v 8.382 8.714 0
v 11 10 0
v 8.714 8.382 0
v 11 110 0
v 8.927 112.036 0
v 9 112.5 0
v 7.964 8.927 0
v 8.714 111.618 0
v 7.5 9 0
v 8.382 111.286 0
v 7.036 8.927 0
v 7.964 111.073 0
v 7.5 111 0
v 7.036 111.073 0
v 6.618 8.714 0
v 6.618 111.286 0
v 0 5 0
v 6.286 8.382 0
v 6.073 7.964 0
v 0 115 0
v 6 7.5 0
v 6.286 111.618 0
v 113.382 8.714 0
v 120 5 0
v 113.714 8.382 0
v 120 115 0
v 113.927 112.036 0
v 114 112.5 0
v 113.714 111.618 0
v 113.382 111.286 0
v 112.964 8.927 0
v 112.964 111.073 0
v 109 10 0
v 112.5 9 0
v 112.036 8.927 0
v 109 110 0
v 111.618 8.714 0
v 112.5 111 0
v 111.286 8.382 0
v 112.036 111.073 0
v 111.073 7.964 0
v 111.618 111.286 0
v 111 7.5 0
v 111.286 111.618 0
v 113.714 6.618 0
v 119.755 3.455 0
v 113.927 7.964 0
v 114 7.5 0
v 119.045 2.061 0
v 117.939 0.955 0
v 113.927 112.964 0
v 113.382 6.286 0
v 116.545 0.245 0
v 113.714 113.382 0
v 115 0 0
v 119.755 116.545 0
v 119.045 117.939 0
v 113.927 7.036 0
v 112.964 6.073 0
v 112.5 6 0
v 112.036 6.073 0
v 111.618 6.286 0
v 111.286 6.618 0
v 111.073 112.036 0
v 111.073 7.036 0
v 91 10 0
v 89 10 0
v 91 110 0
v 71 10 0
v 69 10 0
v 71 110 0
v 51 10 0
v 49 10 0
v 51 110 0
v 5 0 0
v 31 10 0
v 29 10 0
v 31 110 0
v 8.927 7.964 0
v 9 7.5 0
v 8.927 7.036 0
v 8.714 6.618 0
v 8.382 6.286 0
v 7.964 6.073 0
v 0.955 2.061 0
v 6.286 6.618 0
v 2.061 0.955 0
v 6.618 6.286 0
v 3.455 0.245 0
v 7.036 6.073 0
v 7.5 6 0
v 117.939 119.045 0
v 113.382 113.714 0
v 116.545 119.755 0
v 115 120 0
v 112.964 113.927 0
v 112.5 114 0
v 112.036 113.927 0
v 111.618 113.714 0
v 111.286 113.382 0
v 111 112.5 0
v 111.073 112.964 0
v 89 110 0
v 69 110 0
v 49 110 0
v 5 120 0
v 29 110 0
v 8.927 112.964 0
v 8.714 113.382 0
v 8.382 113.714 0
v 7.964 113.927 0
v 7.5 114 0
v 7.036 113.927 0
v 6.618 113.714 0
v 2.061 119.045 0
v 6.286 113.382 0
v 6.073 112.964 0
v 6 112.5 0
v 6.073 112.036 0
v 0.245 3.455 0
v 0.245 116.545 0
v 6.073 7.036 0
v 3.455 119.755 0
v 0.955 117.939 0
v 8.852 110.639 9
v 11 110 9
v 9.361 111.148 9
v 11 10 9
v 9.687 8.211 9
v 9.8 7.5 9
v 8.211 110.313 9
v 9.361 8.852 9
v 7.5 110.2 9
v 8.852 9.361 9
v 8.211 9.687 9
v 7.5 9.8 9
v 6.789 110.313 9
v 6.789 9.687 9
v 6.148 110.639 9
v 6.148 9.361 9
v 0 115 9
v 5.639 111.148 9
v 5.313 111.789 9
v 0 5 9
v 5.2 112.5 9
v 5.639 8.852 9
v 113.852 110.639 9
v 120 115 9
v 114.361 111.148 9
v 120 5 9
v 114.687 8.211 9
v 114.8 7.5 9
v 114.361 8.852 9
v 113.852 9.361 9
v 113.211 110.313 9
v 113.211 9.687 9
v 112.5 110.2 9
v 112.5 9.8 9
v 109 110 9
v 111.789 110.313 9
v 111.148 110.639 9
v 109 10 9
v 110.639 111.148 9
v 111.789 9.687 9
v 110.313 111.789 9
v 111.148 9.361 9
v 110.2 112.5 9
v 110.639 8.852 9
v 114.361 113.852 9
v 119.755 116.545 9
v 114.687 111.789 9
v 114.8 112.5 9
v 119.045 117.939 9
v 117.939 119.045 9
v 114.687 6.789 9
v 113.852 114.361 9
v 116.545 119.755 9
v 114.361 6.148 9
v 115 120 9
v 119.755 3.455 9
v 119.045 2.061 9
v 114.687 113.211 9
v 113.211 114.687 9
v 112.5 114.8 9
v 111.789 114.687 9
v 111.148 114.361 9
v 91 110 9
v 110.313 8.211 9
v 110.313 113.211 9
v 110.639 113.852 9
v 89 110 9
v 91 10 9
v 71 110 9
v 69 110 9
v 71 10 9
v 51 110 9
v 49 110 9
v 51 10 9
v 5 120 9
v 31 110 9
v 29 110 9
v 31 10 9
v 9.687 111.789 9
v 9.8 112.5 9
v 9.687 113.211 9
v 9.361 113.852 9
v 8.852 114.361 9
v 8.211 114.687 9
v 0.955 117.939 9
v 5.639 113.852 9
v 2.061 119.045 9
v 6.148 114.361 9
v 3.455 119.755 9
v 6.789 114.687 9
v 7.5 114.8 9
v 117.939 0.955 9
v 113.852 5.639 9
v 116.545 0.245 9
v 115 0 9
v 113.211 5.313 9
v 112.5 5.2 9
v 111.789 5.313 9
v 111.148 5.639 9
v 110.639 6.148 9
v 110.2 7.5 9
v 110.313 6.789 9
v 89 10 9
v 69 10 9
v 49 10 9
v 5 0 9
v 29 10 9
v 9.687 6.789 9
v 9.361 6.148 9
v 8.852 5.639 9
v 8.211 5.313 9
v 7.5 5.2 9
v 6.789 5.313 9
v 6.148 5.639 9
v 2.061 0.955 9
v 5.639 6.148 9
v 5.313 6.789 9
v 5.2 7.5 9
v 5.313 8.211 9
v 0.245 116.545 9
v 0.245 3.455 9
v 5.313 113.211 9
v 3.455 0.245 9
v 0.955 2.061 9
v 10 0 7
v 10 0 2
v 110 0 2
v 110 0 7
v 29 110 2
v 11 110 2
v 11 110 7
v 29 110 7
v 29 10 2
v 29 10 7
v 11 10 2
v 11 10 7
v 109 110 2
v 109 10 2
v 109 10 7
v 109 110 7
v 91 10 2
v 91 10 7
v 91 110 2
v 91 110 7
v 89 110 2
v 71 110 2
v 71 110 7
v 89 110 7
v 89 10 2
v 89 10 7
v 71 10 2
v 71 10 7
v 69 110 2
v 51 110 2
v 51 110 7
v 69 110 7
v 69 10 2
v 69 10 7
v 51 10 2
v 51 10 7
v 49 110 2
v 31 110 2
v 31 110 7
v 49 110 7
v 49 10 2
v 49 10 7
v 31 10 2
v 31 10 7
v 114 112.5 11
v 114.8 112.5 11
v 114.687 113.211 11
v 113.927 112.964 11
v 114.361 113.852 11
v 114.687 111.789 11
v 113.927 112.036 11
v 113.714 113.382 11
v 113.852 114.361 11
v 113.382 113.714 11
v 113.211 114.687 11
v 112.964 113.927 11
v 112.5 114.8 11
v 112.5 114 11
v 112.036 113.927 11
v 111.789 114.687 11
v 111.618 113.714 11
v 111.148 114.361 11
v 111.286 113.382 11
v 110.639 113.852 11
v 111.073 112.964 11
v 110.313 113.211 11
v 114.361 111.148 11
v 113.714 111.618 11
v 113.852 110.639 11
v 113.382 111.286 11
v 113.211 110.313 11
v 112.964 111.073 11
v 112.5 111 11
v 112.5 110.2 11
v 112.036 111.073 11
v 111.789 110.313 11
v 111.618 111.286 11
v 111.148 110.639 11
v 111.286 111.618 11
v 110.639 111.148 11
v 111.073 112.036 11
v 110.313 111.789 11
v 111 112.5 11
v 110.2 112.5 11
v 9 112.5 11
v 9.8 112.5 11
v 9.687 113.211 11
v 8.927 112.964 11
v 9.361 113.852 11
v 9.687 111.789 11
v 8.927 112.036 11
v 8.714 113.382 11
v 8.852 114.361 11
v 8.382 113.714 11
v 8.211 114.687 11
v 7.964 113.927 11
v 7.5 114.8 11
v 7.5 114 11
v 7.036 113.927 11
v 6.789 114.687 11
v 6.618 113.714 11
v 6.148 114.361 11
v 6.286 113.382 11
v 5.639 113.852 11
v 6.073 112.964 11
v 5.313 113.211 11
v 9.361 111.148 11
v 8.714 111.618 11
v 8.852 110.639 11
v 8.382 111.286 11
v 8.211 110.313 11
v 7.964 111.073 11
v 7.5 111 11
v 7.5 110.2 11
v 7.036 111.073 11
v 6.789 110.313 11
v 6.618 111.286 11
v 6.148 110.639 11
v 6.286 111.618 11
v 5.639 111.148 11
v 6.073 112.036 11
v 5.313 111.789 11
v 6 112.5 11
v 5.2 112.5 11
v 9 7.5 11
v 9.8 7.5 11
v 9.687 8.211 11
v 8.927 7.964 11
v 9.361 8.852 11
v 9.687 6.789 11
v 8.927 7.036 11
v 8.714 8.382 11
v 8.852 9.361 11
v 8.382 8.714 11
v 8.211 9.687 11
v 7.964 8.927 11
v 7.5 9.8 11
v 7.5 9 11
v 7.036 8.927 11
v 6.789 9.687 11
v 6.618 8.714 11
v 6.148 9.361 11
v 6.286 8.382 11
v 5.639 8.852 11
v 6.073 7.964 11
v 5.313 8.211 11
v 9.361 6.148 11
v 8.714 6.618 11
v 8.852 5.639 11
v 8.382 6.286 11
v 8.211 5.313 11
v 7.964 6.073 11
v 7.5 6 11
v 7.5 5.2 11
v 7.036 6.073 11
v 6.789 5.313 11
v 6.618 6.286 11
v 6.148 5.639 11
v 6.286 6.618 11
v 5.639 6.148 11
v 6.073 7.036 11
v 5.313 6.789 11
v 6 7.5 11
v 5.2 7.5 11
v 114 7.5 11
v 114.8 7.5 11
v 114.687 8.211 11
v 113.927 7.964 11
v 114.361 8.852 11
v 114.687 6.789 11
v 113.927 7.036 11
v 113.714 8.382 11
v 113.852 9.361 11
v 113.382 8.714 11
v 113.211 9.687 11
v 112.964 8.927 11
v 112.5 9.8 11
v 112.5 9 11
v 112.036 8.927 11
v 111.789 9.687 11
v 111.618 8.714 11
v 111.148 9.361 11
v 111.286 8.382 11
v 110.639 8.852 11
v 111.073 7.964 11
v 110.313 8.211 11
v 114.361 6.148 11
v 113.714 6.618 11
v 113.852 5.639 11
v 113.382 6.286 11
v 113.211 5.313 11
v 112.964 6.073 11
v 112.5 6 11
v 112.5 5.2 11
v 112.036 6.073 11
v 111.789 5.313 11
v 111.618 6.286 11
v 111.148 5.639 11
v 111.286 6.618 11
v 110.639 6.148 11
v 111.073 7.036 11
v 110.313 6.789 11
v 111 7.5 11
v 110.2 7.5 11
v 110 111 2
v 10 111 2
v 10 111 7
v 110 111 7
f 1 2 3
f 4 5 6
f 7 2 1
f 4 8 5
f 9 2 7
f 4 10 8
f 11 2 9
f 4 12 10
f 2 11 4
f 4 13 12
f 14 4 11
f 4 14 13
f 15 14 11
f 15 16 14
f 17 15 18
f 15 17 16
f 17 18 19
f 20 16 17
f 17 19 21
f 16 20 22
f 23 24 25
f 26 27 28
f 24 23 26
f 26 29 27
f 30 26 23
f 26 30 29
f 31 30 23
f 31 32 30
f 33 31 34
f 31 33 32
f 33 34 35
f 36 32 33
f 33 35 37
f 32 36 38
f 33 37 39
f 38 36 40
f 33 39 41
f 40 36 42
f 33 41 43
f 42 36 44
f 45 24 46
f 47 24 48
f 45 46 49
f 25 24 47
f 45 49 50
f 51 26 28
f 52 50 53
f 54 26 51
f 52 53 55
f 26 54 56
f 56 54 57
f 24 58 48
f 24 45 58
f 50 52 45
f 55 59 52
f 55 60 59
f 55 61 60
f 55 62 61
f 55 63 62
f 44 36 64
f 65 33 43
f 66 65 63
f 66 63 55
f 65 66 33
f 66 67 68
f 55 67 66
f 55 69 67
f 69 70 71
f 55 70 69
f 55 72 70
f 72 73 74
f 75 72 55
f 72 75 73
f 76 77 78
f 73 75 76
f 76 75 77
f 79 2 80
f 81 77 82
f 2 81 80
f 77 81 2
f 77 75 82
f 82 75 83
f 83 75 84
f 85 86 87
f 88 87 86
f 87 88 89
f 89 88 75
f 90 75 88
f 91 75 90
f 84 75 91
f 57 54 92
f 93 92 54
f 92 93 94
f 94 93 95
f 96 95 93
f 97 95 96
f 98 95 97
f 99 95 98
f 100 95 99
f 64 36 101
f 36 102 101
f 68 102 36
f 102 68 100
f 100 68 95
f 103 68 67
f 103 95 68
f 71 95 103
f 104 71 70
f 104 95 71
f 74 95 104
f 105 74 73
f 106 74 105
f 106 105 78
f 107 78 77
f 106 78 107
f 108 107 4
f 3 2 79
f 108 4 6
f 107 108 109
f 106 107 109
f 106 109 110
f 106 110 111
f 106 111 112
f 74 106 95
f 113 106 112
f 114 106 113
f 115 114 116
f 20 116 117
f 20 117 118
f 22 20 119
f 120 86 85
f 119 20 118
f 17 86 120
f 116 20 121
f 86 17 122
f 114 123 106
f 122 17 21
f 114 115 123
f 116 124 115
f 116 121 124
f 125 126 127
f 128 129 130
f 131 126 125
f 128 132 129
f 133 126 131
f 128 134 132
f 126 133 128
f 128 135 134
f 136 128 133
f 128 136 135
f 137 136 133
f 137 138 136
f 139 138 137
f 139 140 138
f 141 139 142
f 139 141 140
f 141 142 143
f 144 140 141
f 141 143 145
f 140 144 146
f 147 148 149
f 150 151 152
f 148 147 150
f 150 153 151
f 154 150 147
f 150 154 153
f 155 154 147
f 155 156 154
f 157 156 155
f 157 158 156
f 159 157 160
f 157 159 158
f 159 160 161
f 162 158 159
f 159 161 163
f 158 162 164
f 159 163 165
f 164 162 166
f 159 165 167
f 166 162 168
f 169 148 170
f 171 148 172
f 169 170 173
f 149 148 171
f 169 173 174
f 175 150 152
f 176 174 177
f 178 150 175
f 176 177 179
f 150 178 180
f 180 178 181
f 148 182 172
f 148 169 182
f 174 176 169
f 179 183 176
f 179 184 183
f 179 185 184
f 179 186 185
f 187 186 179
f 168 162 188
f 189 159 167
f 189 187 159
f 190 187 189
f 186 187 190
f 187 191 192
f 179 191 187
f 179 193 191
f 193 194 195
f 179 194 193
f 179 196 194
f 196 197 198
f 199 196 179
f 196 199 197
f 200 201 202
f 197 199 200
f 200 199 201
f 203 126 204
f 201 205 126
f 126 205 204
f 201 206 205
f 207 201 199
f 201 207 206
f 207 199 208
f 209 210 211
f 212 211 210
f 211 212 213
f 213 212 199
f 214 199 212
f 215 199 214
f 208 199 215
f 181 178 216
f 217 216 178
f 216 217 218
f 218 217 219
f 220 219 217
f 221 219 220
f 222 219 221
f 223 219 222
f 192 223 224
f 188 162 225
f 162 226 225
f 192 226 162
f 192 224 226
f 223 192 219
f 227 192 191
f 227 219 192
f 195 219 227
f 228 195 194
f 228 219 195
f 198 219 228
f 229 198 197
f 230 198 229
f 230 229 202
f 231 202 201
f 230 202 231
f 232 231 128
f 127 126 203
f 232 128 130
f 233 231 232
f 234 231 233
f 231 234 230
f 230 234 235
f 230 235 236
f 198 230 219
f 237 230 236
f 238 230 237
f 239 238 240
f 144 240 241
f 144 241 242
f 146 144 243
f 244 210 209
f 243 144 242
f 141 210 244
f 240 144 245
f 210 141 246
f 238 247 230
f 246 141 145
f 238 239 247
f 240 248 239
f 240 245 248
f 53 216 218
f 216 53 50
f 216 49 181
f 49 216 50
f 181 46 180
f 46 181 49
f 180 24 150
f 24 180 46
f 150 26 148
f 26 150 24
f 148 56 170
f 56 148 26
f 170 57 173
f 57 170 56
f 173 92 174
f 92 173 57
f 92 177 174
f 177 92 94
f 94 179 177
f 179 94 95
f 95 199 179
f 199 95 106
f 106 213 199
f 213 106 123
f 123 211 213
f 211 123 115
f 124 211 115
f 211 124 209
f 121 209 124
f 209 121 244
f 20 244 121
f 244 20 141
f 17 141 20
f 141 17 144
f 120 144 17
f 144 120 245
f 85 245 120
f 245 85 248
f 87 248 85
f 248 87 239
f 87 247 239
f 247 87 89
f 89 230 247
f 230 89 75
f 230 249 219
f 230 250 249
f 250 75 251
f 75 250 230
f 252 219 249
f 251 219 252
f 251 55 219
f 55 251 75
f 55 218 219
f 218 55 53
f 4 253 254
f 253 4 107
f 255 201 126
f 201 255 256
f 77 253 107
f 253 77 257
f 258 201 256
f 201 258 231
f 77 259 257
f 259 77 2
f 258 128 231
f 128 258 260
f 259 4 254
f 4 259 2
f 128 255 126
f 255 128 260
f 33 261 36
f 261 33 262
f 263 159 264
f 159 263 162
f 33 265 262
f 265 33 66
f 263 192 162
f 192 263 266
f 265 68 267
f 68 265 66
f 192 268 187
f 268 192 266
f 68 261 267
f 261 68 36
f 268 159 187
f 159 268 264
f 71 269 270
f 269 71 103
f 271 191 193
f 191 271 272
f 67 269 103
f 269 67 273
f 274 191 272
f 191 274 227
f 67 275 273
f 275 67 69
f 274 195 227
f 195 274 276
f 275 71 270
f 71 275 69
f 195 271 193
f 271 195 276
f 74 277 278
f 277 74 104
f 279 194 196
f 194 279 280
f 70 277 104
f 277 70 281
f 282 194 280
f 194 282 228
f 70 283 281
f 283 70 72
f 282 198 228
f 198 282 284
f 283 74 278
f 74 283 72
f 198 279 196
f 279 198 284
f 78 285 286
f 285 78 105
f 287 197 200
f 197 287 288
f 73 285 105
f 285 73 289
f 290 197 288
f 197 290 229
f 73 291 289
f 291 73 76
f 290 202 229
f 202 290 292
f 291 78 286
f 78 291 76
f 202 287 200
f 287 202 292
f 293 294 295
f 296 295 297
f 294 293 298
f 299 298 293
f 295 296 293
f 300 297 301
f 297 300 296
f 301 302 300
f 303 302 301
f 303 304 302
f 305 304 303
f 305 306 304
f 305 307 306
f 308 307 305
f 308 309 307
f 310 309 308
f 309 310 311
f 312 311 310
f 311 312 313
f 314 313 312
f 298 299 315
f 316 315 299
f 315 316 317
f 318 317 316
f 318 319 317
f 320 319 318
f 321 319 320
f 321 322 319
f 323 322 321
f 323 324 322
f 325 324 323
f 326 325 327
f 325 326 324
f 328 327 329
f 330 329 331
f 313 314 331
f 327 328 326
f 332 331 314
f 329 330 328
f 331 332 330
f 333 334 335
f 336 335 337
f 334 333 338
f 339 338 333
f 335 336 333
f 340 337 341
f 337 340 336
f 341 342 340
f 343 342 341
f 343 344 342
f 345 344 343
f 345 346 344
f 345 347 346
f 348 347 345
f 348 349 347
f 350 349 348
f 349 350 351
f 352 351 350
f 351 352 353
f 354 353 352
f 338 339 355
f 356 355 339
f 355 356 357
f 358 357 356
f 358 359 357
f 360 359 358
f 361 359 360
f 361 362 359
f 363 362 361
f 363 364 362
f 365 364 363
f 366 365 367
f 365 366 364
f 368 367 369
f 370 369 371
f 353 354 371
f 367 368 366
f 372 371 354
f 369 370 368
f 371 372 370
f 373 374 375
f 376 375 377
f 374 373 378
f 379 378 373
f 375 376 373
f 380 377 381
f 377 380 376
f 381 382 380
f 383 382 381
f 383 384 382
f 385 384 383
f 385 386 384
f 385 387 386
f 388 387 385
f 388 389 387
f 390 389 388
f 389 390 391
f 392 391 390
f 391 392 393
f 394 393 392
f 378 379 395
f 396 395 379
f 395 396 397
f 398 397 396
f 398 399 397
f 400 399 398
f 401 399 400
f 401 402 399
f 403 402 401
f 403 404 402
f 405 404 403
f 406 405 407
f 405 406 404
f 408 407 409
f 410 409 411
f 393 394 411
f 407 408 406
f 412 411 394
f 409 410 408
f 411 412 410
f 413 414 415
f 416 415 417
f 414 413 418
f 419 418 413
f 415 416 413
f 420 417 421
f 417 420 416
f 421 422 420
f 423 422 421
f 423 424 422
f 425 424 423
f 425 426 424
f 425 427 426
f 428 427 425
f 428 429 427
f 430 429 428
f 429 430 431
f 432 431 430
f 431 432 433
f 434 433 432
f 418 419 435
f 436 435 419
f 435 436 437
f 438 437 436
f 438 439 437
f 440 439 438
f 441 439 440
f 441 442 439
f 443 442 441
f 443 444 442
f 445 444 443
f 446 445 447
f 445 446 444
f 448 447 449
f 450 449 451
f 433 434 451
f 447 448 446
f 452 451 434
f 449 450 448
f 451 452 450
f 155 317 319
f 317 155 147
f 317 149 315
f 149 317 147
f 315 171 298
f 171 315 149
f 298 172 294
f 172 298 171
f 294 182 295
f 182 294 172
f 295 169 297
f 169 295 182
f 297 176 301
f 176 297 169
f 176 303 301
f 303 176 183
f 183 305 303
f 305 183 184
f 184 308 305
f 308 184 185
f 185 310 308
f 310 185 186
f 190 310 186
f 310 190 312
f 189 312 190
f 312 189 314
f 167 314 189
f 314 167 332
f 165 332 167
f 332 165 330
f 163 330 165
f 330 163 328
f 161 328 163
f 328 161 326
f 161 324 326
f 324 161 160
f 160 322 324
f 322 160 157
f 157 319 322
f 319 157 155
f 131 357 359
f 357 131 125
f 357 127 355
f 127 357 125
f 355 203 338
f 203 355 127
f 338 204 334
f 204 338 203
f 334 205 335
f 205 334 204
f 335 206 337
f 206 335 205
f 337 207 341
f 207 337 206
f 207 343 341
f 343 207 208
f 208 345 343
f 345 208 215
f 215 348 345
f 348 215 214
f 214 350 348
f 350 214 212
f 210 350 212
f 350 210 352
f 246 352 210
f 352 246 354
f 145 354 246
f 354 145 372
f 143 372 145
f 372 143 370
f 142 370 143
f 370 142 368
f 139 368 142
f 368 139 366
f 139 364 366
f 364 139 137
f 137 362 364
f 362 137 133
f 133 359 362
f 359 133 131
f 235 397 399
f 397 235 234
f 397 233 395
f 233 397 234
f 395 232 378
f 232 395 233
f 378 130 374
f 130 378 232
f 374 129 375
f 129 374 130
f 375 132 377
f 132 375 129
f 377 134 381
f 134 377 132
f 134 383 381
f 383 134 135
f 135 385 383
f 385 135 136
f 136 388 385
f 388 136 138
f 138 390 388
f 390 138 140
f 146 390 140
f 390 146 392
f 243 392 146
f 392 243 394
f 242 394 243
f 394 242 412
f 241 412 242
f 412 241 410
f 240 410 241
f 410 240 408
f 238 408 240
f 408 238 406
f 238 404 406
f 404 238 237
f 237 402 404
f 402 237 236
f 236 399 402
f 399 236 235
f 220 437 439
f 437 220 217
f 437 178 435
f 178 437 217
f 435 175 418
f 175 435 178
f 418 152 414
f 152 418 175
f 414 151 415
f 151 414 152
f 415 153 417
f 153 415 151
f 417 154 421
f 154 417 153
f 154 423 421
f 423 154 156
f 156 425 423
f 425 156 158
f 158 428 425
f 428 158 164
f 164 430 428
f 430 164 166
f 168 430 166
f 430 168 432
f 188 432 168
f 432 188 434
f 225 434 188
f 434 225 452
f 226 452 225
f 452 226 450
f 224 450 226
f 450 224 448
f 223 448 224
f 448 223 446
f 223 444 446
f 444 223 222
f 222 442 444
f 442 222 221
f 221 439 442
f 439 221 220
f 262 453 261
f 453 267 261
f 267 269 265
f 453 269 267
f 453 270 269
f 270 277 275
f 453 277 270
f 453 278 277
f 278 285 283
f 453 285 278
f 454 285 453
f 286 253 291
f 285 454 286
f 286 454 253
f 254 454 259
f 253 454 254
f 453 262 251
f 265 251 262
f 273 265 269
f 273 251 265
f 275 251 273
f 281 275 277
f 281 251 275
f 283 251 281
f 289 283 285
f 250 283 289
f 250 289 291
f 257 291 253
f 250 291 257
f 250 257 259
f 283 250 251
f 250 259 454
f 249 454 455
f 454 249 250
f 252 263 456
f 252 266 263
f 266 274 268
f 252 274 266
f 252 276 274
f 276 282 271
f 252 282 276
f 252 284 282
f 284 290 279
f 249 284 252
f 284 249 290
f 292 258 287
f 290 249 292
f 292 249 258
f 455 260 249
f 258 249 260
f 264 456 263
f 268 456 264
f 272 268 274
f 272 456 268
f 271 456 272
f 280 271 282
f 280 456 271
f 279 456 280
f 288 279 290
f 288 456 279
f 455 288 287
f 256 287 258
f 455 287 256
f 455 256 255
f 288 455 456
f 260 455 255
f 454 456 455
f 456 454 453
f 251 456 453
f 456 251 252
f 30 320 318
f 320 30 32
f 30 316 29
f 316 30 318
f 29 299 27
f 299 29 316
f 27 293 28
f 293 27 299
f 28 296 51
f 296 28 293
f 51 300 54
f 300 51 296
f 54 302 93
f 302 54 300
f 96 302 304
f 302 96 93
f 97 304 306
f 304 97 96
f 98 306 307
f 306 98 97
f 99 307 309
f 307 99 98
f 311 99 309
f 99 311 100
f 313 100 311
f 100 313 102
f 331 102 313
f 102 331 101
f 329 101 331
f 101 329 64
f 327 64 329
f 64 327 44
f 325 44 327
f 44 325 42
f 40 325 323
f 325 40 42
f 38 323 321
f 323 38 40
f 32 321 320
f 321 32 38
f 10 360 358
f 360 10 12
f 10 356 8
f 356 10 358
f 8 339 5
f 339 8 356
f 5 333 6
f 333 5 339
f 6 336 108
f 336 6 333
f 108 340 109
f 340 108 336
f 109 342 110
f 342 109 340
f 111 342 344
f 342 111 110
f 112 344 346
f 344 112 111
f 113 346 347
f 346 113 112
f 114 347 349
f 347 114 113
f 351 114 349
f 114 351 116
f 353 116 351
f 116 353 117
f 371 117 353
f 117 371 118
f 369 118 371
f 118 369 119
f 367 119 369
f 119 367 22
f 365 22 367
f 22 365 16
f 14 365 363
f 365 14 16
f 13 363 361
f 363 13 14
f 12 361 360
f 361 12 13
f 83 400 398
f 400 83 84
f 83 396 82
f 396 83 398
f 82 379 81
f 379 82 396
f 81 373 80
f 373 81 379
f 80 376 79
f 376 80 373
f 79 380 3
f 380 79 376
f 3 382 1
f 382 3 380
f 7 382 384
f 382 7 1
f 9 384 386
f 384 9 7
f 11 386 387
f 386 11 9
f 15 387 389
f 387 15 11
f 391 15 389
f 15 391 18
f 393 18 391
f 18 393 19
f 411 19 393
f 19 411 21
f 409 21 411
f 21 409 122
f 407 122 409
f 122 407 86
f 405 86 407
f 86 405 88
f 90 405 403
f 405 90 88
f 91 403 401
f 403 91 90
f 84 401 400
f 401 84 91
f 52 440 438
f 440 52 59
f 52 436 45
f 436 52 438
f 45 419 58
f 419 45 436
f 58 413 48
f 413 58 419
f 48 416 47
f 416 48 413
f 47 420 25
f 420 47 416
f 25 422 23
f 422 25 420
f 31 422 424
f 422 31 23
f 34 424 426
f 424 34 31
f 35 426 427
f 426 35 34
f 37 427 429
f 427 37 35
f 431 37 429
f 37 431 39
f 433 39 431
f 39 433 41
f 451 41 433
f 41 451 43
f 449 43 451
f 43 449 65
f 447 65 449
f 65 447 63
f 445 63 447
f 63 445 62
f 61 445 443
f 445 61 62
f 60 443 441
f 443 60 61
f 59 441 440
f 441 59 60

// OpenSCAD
// file: lib.scad
include <params.scad>;

function tol(val) = val - tolerance;

module cone(r, angle, invert=false) {
    h = tan(angle / 2) * r;
    if (invert) {
        cylinder(r1=r,r2=0,h=h, $fn=20); 
    } else {
        cylinder(r1=0,r2=r,h=h, $fn=20); 
    }
}

module profile($fn=20) {
    minkowski() {
        translate([fan_case_radius, fan_case_radius, 0])
            square(fan_case - fan_case_radius * 2);
        circle(fan_case_radius, $fn);
    }
}

module fan_mount_points(radius, $fn=20) {
    offset = (fan_case - fan_screw_distance) / 2;
    translate([offset, offset, 0]) {
        circle(radius, $fn);
        translate([fan_screw_distance, 0, 0])
            circle(radius, $fn);
        translate([fan_screw_distance, fan_screw_distance, 0])
            circle(radius, $fn);
        translate([0, fan_screw_distance, 0])
            circle(radius, $fn);
    }
}
// file: params.scad
fan_case = 120;
fan_screw_distance = 105;
fan_case_depth = 25;
fan_case_radius = 5;
fan_case_screw_radius = 2.5;
fan_case_screw_head_radius = 3;
fan_case_screw_head_angle = 90;

grill_screw_size = 3;
grill_screw_radius = grill_screw_size / 2;
grill_screw_inset = 2;
grill_radius = 114 / 2;
grill_fin_offset = 10;
grill_fin_thickness = 2;
grill_fin_degrees = 30;

rear_grill_thickness = 2;

front_grill_thickness = 2;
front_grill_fin_spacing = 20;
front_grill_fin_thickness = 2;

filter_thickness = 5;

tolerance = 0.2;
// main file
include <params.scad>;
use <lib.scad>;

filter_width = fan_screw_distance - fan_case_screw_radius * 2;
filter_offset = (fan_case - filter_width) / 2;
total_height = front_grill_thickness * 2 + filter_thickness;
grill_width = floor(filter_width / front_grill_fin_spacing) * front_grill_fin_spacing;
grill_offset = filter_width - grill_width;
grill_start = grill_offset - front_grill_fin_thickness / 2;

module square_grill() {
    translate([filter_offset, filter_offset])
    difference() {
        square(filter_width);
        union() {
            for (i = [grill_start:front_grill_fin_spacing:grill_width]) {
                translate([i, 0, 0])
                    square([front_grill_fin_thickness, filter_width]);
            }
        }
    }
}

difference() {
    union() {
        linear_extrude(height=total_height)
            difference() {
                profile();
                square_grill();
            }
        translate([0, 0, total_height])
            linear_extrude(height=grill_screw_inset)
                fan_mount_points(tol(fan_case_screw_radius));
    }
    translate([filter_offset, 0, front_grill_thickness])
        linear_extrude(height=filter_thickness)
            square([filter_width, filter_width + filter_offset + front_grill_fin_thickness / 2]);
    linear_extrude(height=total_height + grill_screw_inset)
        fan_mount_points(grill_screw_size/2);
}
